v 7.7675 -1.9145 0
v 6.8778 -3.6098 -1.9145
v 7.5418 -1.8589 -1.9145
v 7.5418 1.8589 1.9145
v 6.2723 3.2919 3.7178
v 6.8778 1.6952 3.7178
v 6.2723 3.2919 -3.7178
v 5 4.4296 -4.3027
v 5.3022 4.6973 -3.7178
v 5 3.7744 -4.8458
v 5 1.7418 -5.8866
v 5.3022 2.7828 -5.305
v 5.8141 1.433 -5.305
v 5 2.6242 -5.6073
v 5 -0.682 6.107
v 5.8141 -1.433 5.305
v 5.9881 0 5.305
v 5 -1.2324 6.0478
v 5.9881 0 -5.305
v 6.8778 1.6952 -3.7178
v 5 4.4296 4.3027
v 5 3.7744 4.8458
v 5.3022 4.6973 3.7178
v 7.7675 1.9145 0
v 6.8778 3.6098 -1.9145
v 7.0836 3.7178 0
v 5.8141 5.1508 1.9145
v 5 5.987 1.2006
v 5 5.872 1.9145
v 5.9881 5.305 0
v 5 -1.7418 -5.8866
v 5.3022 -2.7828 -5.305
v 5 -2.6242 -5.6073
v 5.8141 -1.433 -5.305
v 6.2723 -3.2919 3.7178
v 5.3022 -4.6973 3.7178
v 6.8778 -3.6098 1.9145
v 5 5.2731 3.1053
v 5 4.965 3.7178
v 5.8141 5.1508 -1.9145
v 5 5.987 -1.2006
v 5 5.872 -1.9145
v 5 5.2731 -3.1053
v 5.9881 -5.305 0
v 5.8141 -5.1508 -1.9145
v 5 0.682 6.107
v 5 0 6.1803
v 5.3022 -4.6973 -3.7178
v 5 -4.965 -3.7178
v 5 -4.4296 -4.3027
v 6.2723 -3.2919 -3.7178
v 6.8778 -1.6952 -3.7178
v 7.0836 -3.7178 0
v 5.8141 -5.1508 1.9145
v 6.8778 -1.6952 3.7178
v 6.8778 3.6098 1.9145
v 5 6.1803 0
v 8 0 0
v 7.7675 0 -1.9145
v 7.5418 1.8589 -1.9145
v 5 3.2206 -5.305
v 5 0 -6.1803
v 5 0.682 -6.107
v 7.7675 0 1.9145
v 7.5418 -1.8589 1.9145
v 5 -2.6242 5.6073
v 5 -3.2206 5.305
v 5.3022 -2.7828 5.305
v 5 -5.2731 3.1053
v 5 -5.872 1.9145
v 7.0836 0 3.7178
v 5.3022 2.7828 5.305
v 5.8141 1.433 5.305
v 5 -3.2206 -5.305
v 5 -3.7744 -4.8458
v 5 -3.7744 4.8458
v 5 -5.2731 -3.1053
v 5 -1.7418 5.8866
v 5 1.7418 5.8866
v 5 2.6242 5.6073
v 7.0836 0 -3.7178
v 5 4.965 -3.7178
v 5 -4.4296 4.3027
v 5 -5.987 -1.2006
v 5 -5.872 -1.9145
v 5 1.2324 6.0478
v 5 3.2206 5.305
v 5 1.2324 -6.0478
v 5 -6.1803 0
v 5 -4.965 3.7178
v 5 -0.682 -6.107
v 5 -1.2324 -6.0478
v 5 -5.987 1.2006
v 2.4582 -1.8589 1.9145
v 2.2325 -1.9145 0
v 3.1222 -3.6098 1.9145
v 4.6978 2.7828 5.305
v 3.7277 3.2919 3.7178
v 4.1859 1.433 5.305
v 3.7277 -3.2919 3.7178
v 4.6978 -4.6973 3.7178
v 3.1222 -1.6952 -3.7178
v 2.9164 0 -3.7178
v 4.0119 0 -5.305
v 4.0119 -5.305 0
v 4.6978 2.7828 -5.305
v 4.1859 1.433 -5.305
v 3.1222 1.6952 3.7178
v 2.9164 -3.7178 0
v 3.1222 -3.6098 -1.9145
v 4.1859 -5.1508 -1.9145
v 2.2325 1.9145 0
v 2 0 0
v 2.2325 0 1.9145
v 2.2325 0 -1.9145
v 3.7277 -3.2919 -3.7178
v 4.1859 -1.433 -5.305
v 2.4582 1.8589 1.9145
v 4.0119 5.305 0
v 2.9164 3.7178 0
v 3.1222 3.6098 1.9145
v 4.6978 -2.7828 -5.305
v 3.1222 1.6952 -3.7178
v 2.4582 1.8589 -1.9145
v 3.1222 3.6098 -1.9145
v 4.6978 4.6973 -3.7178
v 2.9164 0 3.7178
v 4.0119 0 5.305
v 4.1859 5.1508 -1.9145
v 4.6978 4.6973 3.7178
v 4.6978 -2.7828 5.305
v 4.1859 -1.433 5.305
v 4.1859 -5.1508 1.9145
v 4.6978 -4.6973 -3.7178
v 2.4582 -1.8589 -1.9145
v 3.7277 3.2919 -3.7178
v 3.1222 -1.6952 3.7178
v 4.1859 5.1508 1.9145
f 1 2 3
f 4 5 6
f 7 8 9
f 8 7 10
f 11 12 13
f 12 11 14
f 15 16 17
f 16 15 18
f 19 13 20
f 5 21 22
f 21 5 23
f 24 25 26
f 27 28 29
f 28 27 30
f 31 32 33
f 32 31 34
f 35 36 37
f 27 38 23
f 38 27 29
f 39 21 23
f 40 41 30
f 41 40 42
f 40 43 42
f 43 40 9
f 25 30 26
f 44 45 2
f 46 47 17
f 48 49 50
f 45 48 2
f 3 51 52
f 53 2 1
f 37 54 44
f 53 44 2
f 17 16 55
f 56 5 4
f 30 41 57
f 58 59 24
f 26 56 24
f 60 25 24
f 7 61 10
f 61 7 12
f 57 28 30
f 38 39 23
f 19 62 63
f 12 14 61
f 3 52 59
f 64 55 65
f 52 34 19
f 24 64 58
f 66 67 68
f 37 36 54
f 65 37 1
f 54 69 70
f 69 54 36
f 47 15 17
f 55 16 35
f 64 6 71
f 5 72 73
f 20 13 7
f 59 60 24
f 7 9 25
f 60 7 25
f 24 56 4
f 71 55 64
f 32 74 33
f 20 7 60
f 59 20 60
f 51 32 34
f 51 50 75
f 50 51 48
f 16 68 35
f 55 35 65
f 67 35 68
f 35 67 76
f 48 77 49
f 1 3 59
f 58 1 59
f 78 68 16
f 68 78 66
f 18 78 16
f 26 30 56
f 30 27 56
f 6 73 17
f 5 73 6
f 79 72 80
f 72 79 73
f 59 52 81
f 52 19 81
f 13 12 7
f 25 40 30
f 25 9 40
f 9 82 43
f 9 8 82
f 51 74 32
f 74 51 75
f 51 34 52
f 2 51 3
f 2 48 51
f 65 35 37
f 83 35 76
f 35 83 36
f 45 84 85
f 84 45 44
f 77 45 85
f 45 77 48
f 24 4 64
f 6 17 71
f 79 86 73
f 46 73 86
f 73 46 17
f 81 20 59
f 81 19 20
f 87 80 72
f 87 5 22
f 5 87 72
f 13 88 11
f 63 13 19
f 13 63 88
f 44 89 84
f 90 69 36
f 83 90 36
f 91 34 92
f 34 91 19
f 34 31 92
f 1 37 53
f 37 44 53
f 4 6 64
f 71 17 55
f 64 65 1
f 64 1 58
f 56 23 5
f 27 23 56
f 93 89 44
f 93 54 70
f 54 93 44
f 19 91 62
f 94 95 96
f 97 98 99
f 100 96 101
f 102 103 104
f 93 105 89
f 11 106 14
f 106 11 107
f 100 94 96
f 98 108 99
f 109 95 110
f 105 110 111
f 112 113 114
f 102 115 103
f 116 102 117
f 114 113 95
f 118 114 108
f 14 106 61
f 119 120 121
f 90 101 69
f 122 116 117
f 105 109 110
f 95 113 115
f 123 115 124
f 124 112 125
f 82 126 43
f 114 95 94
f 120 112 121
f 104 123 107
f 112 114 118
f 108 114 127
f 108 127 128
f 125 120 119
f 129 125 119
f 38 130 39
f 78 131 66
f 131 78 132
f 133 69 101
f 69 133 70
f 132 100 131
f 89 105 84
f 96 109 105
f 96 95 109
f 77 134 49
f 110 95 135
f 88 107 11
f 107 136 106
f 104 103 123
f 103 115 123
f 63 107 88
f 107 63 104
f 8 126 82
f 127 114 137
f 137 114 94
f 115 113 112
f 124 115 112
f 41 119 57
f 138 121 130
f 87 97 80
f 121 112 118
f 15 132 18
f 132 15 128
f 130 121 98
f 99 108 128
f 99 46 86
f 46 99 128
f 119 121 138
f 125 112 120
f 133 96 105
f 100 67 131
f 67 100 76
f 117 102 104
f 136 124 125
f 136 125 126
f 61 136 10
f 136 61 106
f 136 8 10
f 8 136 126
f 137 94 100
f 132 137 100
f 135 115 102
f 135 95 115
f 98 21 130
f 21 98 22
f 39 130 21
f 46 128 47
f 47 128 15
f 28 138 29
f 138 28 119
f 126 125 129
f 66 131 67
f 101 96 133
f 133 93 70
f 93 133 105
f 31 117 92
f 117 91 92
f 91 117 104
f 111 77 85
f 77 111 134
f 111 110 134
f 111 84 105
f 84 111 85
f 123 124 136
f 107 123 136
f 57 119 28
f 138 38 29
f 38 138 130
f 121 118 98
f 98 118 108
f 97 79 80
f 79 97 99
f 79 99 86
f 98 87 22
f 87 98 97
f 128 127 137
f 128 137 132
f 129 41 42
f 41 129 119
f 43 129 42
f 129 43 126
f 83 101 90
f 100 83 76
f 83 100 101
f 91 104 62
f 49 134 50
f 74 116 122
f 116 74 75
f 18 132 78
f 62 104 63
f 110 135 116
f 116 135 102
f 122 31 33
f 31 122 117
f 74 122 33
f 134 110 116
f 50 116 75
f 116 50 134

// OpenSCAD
// model30.scad - Test intersection_for operation
// Spheres overlap so intersection is non-empty
intersection_for(i = [0:2]) {
    translate([i*5,0,0]) {
        sphere(8);
    }
}
